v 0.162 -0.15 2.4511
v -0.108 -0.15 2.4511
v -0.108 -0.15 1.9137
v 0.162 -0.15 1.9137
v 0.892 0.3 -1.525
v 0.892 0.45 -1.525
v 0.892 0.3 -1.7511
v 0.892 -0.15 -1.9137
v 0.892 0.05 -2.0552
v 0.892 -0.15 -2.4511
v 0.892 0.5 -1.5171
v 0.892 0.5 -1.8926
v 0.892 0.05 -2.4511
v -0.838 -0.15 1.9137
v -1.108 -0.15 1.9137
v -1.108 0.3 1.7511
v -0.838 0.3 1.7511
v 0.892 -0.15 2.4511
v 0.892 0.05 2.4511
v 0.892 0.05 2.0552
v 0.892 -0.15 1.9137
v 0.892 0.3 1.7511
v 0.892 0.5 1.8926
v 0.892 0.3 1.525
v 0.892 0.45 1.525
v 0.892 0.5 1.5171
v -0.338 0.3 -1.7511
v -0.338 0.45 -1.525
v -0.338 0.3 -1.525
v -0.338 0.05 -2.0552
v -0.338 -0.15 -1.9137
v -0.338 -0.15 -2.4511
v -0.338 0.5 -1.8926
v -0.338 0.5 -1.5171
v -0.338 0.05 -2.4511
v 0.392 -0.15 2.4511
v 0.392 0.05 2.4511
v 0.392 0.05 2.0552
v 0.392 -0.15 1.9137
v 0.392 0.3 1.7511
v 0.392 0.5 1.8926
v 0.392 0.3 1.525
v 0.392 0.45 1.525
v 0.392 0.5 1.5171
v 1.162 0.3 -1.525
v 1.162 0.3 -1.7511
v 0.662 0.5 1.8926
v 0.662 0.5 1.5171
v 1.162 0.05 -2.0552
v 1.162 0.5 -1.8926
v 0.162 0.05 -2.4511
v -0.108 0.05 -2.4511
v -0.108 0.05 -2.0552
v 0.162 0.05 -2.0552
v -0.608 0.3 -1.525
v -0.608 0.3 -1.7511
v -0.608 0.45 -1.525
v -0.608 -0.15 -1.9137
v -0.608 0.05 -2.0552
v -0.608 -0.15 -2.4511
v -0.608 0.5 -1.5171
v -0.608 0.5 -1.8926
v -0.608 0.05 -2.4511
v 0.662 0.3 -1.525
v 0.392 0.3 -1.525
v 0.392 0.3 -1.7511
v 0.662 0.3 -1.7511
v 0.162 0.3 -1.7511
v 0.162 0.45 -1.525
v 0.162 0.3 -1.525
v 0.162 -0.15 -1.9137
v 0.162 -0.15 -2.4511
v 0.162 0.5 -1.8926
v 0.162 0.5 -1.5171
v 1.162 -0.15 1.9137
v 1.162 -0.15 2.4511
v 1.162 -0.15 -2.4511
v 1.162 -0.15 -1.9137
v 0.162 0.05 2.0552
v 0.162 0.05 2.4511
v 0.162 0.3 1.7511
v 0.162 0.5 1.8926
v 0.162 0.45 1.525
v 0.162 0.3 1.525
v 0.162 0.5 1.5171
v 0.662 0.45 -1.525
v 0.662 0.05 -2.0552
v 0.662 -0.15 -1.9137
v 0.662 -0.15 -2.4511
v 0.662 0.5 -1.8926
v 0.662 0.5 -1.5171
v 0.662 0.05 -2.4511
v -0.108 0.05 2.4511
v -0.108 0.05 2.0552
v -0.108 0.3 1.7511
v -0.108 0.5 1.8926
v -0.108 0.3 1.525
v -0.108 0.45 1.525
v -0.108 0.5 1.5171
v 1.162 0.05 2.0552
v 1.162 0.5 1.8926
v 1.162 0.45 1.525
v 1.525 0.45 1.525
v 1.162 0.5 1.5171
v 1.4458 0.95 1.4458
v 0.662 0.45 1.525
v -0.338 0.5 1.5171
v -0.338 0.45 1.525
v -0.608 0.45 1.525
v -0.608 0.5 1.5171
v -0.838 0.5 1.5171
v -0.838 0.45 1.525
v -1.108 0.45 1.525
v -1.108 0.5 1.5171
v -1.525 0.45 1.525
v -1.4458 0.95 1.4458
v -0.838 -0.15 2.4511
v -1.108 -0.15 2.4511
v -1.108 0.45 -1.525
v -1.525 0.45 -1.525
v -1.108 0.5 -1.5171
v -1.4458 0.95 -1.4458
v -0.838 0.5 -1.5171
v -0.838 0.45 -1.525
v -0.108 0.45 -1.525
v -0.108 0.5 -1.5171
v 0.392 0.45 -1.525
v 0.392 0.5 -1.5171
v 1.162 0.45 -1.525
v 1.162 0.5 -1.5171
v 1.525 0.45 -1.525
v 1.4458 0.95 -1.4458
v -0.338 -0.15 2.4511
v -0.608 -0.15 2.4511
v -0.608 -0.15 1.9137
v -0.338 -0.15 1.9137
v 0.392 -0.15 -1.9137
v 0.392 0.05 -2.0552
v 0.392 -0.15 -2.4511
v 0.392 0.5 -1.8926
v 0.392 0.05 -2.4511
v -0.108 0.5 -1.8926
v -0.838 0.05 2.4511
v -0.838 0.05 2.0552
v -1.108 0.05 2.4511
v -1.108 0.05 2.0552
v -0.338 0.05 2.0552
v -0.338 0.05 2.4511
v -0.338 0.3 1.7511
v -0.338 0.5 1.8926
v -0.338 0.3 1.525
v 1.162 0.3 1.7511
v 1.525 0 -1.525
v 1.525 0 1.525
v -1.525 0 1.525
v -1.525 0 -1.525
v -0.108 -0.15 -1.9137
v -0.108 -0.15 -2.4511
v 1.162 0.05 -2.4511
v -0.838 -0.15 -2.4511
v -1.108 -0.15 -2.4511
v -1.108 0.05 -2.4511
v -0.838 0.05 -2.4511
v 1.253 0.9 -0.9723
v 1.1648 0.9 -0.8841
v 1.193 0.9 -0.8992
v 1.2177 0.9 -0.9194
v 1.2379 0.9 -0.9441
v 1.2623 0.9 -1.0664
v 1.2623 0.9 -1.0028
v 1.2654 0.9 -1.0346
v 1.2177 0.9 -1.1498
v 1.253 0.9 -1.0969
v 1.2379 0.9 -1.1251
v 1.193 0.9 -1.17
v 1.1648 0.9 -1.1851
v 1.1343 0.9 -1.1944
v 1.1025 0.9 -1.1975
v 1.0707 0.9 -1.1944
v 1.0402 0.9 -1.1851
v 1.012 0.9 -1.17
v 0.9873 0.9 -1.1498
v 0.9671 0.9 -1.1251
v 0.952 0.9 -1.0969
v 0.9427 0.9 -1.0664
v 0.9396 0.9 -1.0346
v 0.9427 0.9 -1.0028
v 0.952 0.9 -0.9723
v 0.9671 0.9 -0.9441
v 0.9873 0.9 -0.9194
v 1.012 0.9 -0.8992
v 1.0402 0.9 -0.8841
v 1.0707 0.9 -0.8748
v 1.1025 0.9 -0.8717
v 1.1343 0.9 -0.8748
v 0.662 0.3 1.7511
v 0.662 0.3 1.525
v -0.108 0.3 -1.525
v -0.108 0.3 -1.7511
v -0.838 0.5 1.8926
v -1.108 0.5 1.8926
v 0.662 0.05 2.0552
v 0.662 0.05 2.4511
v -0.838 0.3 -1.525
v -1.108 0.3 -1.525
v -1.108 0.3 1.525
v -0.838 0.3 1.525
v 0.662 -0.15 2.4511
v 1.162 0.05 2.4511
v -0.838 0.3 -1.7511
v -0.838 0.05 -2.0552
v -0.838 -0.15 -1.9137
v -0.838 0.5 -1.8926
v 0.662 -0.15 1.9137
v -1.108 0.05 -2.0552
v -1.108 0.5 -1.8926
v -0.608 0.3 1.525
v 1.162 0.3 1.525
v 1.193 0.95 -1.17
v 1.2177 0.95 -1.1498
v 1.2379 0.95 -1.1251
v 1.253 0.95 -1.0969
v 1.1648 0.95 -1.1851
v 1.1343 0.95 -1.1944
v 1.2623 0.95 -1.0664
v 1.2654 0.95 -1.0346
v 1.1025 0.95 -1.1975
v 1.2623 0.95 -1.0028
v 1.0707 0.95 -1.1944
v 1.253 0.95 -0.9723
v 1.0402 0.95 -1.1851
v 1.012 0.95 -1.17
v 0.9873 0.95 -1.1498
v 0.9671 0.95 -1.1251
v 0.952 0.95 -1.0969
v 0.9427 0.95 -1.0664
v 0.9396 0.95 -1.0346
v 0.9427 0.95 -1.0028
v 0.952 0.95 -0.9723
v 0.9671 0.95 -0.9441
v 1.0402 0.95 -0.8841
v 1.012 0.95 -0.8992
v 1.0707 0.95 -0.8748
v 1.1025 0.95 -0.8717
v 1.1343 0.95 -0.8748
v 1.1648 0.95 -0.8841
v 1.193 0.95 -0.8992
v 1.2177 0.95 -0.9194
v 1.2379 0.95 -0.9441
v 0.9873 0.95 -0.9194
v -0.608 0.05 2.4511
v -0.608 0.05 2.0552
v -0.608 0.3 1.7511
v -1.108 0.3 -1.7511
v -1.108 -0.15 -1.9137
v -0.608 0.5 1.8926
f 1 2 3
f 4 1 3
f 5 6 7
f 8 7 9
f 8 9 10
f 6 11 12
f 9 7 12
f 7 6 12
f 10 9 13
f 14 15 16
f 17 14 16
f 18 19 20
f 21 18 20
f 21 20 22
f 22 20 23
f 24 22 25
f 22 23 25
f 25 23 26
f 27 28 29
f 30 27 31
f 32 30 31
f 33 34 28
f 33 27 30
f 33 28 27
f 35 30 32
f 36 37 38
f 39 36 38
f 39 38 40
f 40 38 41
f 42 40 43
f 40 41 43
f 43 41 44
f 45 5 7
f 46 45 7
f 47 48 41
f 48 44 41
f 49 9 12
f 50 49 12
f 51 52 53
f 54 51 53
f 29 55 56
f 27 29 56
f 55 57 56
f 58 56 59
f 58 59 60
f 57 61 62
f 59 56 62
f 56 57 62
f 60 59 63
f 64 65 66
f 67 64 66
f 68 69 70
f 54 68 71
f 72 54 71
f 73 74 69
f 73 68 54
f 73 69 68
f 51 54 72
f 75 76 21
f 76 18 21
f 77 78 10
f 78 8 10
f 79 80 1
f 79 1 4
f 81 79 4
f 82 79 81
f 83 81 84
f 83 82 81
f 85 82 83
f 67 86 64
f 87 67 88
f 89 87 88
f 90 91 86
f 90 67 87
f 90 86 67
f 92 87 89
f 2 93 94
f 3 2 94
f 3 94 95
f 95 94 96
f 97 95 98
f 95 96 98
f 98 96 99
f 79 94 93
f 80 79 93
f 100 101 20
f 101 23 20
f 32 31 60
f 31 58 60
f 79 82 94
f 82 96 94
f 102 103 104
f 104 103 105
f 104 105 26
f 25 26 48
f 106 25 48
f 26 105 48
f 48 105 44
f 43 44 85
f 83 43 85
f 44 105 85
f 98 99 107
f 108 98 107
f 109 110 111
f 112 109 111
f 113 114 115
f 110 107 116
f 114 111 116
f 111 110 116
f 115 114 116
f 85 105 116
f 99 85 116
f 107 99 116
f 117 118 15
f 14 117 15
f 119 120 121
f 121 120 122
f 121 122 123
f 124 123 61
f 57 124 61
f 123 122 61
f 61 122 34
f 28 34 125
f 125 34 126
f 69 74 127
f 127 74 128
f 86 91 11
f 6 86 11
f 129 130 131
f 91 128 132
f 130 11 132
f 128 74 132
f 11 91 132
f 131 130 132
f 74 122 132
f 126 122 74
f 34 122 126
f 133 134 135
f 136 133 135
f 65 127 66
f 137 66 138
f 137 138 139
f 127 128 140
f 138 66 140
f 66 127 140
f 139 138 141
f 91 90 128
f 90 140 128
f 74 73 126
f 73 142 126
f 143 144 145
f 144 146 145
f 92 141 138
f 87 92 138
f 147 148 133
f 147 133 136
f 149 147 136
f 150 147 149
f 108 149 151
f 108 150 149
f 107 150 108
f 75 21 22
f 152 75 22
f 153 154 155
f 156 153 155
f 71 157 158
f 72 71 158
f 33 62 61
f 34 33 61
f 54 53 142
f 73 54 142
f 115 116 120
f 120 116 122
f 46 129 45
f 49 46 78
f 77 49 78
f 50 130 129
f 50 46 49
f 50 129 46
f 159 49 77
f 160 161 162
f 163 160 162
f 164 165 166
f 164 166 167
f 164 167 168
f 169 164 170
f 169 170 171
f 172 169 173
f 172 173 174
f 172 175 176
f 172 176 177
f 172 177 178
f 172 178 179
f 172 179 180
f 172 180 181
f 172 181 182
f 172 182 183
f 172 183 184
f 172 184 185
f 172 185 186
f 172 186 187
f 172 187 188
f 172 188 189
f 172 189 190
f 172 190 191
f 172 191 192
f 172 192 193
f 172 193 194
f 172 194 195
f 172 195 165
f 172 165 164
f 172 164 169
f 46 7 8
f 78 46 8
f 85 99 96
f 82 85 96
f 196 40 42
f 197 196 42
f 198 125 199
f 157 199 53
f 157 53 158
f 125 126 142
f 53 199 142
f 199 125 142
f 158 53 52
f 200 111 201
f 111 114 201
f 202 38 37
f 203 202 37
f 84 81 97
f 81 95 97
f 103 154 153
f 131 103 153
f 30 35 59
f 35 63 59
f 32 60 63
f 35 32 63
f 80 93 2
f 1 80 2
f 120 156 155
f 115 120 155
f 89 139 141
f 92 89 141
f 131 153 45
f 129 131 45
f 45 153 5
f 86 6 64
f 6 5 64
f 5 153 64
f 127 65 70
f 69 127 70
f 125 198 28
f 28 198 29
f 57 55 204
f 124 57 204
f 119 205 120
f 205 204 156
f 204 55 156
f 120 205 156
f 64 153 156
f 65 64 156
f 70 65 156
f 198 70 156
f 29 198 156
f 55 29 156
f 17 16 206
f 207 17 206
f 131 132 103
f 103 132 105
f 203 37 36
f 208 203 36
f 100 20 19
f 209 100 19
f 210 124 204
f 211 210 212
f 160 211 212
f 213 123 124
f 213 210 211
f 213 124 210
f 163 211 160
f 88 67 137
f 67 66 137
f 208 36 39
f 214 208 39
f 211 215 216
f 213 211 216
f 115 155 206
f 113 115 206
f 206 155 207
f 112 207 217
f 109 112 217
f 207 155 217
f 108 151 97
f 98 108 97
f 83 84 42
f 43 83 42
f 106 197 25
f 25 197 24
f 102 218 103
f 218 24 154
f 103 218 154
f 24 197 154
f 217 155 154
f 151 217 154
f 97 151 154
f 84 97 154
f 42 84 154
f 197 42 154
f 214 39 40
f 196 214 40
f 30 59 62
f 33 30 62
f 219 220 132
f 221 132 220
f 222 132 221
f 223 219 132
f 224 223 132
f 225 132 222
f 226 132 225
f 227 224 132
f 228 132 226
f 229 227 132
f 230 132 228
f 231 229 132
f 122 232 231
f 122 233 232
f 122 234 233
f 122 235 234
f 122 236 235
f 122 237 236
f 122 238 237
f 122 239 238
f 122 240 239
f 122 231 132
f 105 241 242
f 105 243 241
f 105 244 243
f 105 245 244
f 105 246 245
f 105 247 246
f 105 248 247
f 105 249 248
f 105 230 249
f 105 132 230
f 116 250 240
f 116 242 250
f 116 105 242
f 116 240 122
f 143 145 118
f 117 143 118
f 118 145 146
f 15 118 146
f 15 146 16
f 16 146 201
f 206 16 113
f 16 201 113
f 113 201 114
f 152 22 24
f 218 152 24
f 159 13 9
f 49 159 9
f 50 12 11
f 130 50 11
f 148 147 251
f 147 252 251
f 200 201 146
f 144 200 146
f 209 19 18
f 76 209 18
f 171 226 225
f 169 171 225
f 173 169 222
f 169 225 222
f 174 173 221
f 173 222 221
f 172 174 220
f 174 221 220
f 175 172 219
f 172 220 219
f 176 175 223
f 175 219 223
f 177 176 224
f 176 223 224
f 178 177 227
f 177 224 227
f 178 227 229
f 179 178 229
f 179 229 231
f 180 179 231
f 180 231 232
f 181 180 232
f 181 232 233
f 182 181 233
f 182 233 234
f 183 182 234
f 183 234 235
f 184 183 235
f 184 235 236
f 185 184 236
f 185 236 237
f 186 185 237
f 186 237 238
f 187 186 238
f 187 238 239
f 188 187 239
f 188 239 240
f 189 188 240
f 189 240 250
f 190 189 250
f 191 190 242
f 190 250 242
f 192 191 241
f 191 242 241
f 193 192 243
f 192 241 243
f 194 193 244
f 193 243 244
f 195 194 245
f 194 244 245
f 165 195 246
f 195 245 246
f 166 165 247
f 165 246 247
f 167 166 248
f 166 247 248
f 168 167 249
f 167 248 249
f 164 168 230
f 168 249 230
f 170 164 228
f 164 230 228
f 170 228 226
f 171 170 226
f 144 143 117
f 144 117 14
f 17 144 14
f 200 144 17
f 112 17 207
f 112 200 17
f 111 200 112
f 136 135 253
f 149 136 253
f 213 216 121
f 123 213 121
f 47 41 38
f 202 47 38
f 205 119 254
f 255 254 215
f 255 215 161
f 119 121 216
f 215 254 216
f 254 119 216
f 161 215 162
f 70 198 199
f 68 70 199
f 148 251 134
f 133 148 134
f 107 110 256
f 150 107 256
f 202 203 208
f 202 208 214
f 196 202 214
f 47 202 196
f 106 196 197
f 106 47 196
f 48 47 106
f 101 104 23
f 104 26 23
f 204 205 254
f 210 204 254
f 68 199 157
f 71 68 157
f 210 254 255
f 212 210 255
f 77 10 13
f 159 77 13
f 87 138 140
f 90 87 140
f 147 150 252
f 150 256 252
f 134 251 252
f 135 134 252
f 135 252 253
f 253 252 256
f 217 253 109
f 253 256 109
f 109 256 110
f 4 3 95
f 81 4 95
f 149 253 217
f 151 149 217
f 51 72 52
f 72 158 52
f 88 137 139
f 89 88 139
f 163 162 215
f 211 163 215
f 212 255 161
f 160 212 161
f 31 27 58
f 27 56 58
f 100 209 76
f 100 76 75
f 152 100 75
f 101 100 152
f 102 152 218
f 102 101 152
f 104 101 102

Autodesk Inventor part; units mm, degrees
ref_plane "YZ Plane" through (0, 0, 0) normal (1, 0, 0) x (0, 1, 0)
ref_plane "XZ Plane" through (0, 0, 0) normal (0, 1, 0) x (-1, 0, 0)
sketch "Sketch1" plane through (0, 0, 0) normal (0, 1, 0) x (-1, 0, 0)
  line L0 (1.525, 1.525) -> (-1.525, 1.525)
  line L1 (-1.525, 1.525) -> (-1.525, -1.525)
  line L2 (-1.525, -1.525) -> (1.525, -1.525)
  line L3 (1.525, -1.525) -> (1.525, 1.525)
  point P0 (0, 0)
  dimension "d0" = 3.05
  dimension "d1" = 1.525
  dimension "d2" = 3.05
  dimension "d3" = 1.525
extrude "Extrusion1" add sketch "Sketch1" along normal blind 0.95
chamfer "Chamfer1" distance 0.5 angle 9 1 edges at (0, 0.95, 1.525) measured on face at (-0.5083, 0.3167, 1.525)
chamfer "Chamfer2" distance 0.5 angle 9 1 edges at (1.525, 0.95, -0.0396) measured on face at (1.525, 0.6333, -0.5347)
chamfer "Chamfer3" distance 0.5 angle 9 1 edges at (-1.525, 0.95, -0.0396) measured on face at (-1.525, 0.6333, -0.5347)
chamfer "Chamfer4" distance 0.5 angle 9 1 edges at (0, 0.95, -1.525) measured on face at (0.4819, 0.6167, -1.525)
ref_plane "Work Plane1" through (1.027, 0, 1.525) normal (1, 0, 0) x (0, 0, -1)
sketch "Sketch2" plane through (1.027, 0, 1.525) normal (1, 0, 0) x (0, 0, -1)
  line L0 (3.0361, 0.5) -> (3.0361, 0.3)
  line L1 (3.0361, 0.3) -> (3.2761, 0.3)
  line L2 (3.2761, 0.3) -> (3.4387, -0.15)
  line L3 (3.4387, -0.15) -> (3.9761, -0.15)
  line L4 (3.9761, -0.15) -> (3.9761, 0.05)
  line L5 (3.9761, 0.05) -> (3.5802, 0.05)
  line L6 (3.5802, 0.05) -> (3.4176, 0.5)
  line L7 (3.4176, 0.5) -> (3.0361, 0.5)
  line L8 (3.05, 0) -> (3.05, 0.45) projected
  line L9 (0, 0) -> (3.05, 0) projected
  point P0 (1.525, 0)
  dimension "d20" = 0.2
  dimension "d21" = 0.2
  dimension "d22" = 0.7
  dimension "d23" = 0.94
  dimension "d24" = 0.65
  dimension "d25" = 0.15
extrude "Extrusion2" add sketch "Sketch2" along normal mid plane 0.27
pattern_linear "Rectangular Pattern1" count 5 spacing 0.5 along (-1, 0, 0) of "Extrusion2"
mirror "Mirror1" about plane through (0, 0, 0) normal (0, 0, 1) of "Extrusion2", "Rectangular Pattern1"
sketch "Sketch3" plane through (0, 0.95, 0) normal (0, 1, 0) x (1, 0, 0)
  circle A0 centre (1.1025, 1.0346) radius 0.1629
  point P0 (0, 0)
extrude "Extrusion3" cut sketch "Sketch3" against normal blind 0.05
properties part number "MAX17552"
